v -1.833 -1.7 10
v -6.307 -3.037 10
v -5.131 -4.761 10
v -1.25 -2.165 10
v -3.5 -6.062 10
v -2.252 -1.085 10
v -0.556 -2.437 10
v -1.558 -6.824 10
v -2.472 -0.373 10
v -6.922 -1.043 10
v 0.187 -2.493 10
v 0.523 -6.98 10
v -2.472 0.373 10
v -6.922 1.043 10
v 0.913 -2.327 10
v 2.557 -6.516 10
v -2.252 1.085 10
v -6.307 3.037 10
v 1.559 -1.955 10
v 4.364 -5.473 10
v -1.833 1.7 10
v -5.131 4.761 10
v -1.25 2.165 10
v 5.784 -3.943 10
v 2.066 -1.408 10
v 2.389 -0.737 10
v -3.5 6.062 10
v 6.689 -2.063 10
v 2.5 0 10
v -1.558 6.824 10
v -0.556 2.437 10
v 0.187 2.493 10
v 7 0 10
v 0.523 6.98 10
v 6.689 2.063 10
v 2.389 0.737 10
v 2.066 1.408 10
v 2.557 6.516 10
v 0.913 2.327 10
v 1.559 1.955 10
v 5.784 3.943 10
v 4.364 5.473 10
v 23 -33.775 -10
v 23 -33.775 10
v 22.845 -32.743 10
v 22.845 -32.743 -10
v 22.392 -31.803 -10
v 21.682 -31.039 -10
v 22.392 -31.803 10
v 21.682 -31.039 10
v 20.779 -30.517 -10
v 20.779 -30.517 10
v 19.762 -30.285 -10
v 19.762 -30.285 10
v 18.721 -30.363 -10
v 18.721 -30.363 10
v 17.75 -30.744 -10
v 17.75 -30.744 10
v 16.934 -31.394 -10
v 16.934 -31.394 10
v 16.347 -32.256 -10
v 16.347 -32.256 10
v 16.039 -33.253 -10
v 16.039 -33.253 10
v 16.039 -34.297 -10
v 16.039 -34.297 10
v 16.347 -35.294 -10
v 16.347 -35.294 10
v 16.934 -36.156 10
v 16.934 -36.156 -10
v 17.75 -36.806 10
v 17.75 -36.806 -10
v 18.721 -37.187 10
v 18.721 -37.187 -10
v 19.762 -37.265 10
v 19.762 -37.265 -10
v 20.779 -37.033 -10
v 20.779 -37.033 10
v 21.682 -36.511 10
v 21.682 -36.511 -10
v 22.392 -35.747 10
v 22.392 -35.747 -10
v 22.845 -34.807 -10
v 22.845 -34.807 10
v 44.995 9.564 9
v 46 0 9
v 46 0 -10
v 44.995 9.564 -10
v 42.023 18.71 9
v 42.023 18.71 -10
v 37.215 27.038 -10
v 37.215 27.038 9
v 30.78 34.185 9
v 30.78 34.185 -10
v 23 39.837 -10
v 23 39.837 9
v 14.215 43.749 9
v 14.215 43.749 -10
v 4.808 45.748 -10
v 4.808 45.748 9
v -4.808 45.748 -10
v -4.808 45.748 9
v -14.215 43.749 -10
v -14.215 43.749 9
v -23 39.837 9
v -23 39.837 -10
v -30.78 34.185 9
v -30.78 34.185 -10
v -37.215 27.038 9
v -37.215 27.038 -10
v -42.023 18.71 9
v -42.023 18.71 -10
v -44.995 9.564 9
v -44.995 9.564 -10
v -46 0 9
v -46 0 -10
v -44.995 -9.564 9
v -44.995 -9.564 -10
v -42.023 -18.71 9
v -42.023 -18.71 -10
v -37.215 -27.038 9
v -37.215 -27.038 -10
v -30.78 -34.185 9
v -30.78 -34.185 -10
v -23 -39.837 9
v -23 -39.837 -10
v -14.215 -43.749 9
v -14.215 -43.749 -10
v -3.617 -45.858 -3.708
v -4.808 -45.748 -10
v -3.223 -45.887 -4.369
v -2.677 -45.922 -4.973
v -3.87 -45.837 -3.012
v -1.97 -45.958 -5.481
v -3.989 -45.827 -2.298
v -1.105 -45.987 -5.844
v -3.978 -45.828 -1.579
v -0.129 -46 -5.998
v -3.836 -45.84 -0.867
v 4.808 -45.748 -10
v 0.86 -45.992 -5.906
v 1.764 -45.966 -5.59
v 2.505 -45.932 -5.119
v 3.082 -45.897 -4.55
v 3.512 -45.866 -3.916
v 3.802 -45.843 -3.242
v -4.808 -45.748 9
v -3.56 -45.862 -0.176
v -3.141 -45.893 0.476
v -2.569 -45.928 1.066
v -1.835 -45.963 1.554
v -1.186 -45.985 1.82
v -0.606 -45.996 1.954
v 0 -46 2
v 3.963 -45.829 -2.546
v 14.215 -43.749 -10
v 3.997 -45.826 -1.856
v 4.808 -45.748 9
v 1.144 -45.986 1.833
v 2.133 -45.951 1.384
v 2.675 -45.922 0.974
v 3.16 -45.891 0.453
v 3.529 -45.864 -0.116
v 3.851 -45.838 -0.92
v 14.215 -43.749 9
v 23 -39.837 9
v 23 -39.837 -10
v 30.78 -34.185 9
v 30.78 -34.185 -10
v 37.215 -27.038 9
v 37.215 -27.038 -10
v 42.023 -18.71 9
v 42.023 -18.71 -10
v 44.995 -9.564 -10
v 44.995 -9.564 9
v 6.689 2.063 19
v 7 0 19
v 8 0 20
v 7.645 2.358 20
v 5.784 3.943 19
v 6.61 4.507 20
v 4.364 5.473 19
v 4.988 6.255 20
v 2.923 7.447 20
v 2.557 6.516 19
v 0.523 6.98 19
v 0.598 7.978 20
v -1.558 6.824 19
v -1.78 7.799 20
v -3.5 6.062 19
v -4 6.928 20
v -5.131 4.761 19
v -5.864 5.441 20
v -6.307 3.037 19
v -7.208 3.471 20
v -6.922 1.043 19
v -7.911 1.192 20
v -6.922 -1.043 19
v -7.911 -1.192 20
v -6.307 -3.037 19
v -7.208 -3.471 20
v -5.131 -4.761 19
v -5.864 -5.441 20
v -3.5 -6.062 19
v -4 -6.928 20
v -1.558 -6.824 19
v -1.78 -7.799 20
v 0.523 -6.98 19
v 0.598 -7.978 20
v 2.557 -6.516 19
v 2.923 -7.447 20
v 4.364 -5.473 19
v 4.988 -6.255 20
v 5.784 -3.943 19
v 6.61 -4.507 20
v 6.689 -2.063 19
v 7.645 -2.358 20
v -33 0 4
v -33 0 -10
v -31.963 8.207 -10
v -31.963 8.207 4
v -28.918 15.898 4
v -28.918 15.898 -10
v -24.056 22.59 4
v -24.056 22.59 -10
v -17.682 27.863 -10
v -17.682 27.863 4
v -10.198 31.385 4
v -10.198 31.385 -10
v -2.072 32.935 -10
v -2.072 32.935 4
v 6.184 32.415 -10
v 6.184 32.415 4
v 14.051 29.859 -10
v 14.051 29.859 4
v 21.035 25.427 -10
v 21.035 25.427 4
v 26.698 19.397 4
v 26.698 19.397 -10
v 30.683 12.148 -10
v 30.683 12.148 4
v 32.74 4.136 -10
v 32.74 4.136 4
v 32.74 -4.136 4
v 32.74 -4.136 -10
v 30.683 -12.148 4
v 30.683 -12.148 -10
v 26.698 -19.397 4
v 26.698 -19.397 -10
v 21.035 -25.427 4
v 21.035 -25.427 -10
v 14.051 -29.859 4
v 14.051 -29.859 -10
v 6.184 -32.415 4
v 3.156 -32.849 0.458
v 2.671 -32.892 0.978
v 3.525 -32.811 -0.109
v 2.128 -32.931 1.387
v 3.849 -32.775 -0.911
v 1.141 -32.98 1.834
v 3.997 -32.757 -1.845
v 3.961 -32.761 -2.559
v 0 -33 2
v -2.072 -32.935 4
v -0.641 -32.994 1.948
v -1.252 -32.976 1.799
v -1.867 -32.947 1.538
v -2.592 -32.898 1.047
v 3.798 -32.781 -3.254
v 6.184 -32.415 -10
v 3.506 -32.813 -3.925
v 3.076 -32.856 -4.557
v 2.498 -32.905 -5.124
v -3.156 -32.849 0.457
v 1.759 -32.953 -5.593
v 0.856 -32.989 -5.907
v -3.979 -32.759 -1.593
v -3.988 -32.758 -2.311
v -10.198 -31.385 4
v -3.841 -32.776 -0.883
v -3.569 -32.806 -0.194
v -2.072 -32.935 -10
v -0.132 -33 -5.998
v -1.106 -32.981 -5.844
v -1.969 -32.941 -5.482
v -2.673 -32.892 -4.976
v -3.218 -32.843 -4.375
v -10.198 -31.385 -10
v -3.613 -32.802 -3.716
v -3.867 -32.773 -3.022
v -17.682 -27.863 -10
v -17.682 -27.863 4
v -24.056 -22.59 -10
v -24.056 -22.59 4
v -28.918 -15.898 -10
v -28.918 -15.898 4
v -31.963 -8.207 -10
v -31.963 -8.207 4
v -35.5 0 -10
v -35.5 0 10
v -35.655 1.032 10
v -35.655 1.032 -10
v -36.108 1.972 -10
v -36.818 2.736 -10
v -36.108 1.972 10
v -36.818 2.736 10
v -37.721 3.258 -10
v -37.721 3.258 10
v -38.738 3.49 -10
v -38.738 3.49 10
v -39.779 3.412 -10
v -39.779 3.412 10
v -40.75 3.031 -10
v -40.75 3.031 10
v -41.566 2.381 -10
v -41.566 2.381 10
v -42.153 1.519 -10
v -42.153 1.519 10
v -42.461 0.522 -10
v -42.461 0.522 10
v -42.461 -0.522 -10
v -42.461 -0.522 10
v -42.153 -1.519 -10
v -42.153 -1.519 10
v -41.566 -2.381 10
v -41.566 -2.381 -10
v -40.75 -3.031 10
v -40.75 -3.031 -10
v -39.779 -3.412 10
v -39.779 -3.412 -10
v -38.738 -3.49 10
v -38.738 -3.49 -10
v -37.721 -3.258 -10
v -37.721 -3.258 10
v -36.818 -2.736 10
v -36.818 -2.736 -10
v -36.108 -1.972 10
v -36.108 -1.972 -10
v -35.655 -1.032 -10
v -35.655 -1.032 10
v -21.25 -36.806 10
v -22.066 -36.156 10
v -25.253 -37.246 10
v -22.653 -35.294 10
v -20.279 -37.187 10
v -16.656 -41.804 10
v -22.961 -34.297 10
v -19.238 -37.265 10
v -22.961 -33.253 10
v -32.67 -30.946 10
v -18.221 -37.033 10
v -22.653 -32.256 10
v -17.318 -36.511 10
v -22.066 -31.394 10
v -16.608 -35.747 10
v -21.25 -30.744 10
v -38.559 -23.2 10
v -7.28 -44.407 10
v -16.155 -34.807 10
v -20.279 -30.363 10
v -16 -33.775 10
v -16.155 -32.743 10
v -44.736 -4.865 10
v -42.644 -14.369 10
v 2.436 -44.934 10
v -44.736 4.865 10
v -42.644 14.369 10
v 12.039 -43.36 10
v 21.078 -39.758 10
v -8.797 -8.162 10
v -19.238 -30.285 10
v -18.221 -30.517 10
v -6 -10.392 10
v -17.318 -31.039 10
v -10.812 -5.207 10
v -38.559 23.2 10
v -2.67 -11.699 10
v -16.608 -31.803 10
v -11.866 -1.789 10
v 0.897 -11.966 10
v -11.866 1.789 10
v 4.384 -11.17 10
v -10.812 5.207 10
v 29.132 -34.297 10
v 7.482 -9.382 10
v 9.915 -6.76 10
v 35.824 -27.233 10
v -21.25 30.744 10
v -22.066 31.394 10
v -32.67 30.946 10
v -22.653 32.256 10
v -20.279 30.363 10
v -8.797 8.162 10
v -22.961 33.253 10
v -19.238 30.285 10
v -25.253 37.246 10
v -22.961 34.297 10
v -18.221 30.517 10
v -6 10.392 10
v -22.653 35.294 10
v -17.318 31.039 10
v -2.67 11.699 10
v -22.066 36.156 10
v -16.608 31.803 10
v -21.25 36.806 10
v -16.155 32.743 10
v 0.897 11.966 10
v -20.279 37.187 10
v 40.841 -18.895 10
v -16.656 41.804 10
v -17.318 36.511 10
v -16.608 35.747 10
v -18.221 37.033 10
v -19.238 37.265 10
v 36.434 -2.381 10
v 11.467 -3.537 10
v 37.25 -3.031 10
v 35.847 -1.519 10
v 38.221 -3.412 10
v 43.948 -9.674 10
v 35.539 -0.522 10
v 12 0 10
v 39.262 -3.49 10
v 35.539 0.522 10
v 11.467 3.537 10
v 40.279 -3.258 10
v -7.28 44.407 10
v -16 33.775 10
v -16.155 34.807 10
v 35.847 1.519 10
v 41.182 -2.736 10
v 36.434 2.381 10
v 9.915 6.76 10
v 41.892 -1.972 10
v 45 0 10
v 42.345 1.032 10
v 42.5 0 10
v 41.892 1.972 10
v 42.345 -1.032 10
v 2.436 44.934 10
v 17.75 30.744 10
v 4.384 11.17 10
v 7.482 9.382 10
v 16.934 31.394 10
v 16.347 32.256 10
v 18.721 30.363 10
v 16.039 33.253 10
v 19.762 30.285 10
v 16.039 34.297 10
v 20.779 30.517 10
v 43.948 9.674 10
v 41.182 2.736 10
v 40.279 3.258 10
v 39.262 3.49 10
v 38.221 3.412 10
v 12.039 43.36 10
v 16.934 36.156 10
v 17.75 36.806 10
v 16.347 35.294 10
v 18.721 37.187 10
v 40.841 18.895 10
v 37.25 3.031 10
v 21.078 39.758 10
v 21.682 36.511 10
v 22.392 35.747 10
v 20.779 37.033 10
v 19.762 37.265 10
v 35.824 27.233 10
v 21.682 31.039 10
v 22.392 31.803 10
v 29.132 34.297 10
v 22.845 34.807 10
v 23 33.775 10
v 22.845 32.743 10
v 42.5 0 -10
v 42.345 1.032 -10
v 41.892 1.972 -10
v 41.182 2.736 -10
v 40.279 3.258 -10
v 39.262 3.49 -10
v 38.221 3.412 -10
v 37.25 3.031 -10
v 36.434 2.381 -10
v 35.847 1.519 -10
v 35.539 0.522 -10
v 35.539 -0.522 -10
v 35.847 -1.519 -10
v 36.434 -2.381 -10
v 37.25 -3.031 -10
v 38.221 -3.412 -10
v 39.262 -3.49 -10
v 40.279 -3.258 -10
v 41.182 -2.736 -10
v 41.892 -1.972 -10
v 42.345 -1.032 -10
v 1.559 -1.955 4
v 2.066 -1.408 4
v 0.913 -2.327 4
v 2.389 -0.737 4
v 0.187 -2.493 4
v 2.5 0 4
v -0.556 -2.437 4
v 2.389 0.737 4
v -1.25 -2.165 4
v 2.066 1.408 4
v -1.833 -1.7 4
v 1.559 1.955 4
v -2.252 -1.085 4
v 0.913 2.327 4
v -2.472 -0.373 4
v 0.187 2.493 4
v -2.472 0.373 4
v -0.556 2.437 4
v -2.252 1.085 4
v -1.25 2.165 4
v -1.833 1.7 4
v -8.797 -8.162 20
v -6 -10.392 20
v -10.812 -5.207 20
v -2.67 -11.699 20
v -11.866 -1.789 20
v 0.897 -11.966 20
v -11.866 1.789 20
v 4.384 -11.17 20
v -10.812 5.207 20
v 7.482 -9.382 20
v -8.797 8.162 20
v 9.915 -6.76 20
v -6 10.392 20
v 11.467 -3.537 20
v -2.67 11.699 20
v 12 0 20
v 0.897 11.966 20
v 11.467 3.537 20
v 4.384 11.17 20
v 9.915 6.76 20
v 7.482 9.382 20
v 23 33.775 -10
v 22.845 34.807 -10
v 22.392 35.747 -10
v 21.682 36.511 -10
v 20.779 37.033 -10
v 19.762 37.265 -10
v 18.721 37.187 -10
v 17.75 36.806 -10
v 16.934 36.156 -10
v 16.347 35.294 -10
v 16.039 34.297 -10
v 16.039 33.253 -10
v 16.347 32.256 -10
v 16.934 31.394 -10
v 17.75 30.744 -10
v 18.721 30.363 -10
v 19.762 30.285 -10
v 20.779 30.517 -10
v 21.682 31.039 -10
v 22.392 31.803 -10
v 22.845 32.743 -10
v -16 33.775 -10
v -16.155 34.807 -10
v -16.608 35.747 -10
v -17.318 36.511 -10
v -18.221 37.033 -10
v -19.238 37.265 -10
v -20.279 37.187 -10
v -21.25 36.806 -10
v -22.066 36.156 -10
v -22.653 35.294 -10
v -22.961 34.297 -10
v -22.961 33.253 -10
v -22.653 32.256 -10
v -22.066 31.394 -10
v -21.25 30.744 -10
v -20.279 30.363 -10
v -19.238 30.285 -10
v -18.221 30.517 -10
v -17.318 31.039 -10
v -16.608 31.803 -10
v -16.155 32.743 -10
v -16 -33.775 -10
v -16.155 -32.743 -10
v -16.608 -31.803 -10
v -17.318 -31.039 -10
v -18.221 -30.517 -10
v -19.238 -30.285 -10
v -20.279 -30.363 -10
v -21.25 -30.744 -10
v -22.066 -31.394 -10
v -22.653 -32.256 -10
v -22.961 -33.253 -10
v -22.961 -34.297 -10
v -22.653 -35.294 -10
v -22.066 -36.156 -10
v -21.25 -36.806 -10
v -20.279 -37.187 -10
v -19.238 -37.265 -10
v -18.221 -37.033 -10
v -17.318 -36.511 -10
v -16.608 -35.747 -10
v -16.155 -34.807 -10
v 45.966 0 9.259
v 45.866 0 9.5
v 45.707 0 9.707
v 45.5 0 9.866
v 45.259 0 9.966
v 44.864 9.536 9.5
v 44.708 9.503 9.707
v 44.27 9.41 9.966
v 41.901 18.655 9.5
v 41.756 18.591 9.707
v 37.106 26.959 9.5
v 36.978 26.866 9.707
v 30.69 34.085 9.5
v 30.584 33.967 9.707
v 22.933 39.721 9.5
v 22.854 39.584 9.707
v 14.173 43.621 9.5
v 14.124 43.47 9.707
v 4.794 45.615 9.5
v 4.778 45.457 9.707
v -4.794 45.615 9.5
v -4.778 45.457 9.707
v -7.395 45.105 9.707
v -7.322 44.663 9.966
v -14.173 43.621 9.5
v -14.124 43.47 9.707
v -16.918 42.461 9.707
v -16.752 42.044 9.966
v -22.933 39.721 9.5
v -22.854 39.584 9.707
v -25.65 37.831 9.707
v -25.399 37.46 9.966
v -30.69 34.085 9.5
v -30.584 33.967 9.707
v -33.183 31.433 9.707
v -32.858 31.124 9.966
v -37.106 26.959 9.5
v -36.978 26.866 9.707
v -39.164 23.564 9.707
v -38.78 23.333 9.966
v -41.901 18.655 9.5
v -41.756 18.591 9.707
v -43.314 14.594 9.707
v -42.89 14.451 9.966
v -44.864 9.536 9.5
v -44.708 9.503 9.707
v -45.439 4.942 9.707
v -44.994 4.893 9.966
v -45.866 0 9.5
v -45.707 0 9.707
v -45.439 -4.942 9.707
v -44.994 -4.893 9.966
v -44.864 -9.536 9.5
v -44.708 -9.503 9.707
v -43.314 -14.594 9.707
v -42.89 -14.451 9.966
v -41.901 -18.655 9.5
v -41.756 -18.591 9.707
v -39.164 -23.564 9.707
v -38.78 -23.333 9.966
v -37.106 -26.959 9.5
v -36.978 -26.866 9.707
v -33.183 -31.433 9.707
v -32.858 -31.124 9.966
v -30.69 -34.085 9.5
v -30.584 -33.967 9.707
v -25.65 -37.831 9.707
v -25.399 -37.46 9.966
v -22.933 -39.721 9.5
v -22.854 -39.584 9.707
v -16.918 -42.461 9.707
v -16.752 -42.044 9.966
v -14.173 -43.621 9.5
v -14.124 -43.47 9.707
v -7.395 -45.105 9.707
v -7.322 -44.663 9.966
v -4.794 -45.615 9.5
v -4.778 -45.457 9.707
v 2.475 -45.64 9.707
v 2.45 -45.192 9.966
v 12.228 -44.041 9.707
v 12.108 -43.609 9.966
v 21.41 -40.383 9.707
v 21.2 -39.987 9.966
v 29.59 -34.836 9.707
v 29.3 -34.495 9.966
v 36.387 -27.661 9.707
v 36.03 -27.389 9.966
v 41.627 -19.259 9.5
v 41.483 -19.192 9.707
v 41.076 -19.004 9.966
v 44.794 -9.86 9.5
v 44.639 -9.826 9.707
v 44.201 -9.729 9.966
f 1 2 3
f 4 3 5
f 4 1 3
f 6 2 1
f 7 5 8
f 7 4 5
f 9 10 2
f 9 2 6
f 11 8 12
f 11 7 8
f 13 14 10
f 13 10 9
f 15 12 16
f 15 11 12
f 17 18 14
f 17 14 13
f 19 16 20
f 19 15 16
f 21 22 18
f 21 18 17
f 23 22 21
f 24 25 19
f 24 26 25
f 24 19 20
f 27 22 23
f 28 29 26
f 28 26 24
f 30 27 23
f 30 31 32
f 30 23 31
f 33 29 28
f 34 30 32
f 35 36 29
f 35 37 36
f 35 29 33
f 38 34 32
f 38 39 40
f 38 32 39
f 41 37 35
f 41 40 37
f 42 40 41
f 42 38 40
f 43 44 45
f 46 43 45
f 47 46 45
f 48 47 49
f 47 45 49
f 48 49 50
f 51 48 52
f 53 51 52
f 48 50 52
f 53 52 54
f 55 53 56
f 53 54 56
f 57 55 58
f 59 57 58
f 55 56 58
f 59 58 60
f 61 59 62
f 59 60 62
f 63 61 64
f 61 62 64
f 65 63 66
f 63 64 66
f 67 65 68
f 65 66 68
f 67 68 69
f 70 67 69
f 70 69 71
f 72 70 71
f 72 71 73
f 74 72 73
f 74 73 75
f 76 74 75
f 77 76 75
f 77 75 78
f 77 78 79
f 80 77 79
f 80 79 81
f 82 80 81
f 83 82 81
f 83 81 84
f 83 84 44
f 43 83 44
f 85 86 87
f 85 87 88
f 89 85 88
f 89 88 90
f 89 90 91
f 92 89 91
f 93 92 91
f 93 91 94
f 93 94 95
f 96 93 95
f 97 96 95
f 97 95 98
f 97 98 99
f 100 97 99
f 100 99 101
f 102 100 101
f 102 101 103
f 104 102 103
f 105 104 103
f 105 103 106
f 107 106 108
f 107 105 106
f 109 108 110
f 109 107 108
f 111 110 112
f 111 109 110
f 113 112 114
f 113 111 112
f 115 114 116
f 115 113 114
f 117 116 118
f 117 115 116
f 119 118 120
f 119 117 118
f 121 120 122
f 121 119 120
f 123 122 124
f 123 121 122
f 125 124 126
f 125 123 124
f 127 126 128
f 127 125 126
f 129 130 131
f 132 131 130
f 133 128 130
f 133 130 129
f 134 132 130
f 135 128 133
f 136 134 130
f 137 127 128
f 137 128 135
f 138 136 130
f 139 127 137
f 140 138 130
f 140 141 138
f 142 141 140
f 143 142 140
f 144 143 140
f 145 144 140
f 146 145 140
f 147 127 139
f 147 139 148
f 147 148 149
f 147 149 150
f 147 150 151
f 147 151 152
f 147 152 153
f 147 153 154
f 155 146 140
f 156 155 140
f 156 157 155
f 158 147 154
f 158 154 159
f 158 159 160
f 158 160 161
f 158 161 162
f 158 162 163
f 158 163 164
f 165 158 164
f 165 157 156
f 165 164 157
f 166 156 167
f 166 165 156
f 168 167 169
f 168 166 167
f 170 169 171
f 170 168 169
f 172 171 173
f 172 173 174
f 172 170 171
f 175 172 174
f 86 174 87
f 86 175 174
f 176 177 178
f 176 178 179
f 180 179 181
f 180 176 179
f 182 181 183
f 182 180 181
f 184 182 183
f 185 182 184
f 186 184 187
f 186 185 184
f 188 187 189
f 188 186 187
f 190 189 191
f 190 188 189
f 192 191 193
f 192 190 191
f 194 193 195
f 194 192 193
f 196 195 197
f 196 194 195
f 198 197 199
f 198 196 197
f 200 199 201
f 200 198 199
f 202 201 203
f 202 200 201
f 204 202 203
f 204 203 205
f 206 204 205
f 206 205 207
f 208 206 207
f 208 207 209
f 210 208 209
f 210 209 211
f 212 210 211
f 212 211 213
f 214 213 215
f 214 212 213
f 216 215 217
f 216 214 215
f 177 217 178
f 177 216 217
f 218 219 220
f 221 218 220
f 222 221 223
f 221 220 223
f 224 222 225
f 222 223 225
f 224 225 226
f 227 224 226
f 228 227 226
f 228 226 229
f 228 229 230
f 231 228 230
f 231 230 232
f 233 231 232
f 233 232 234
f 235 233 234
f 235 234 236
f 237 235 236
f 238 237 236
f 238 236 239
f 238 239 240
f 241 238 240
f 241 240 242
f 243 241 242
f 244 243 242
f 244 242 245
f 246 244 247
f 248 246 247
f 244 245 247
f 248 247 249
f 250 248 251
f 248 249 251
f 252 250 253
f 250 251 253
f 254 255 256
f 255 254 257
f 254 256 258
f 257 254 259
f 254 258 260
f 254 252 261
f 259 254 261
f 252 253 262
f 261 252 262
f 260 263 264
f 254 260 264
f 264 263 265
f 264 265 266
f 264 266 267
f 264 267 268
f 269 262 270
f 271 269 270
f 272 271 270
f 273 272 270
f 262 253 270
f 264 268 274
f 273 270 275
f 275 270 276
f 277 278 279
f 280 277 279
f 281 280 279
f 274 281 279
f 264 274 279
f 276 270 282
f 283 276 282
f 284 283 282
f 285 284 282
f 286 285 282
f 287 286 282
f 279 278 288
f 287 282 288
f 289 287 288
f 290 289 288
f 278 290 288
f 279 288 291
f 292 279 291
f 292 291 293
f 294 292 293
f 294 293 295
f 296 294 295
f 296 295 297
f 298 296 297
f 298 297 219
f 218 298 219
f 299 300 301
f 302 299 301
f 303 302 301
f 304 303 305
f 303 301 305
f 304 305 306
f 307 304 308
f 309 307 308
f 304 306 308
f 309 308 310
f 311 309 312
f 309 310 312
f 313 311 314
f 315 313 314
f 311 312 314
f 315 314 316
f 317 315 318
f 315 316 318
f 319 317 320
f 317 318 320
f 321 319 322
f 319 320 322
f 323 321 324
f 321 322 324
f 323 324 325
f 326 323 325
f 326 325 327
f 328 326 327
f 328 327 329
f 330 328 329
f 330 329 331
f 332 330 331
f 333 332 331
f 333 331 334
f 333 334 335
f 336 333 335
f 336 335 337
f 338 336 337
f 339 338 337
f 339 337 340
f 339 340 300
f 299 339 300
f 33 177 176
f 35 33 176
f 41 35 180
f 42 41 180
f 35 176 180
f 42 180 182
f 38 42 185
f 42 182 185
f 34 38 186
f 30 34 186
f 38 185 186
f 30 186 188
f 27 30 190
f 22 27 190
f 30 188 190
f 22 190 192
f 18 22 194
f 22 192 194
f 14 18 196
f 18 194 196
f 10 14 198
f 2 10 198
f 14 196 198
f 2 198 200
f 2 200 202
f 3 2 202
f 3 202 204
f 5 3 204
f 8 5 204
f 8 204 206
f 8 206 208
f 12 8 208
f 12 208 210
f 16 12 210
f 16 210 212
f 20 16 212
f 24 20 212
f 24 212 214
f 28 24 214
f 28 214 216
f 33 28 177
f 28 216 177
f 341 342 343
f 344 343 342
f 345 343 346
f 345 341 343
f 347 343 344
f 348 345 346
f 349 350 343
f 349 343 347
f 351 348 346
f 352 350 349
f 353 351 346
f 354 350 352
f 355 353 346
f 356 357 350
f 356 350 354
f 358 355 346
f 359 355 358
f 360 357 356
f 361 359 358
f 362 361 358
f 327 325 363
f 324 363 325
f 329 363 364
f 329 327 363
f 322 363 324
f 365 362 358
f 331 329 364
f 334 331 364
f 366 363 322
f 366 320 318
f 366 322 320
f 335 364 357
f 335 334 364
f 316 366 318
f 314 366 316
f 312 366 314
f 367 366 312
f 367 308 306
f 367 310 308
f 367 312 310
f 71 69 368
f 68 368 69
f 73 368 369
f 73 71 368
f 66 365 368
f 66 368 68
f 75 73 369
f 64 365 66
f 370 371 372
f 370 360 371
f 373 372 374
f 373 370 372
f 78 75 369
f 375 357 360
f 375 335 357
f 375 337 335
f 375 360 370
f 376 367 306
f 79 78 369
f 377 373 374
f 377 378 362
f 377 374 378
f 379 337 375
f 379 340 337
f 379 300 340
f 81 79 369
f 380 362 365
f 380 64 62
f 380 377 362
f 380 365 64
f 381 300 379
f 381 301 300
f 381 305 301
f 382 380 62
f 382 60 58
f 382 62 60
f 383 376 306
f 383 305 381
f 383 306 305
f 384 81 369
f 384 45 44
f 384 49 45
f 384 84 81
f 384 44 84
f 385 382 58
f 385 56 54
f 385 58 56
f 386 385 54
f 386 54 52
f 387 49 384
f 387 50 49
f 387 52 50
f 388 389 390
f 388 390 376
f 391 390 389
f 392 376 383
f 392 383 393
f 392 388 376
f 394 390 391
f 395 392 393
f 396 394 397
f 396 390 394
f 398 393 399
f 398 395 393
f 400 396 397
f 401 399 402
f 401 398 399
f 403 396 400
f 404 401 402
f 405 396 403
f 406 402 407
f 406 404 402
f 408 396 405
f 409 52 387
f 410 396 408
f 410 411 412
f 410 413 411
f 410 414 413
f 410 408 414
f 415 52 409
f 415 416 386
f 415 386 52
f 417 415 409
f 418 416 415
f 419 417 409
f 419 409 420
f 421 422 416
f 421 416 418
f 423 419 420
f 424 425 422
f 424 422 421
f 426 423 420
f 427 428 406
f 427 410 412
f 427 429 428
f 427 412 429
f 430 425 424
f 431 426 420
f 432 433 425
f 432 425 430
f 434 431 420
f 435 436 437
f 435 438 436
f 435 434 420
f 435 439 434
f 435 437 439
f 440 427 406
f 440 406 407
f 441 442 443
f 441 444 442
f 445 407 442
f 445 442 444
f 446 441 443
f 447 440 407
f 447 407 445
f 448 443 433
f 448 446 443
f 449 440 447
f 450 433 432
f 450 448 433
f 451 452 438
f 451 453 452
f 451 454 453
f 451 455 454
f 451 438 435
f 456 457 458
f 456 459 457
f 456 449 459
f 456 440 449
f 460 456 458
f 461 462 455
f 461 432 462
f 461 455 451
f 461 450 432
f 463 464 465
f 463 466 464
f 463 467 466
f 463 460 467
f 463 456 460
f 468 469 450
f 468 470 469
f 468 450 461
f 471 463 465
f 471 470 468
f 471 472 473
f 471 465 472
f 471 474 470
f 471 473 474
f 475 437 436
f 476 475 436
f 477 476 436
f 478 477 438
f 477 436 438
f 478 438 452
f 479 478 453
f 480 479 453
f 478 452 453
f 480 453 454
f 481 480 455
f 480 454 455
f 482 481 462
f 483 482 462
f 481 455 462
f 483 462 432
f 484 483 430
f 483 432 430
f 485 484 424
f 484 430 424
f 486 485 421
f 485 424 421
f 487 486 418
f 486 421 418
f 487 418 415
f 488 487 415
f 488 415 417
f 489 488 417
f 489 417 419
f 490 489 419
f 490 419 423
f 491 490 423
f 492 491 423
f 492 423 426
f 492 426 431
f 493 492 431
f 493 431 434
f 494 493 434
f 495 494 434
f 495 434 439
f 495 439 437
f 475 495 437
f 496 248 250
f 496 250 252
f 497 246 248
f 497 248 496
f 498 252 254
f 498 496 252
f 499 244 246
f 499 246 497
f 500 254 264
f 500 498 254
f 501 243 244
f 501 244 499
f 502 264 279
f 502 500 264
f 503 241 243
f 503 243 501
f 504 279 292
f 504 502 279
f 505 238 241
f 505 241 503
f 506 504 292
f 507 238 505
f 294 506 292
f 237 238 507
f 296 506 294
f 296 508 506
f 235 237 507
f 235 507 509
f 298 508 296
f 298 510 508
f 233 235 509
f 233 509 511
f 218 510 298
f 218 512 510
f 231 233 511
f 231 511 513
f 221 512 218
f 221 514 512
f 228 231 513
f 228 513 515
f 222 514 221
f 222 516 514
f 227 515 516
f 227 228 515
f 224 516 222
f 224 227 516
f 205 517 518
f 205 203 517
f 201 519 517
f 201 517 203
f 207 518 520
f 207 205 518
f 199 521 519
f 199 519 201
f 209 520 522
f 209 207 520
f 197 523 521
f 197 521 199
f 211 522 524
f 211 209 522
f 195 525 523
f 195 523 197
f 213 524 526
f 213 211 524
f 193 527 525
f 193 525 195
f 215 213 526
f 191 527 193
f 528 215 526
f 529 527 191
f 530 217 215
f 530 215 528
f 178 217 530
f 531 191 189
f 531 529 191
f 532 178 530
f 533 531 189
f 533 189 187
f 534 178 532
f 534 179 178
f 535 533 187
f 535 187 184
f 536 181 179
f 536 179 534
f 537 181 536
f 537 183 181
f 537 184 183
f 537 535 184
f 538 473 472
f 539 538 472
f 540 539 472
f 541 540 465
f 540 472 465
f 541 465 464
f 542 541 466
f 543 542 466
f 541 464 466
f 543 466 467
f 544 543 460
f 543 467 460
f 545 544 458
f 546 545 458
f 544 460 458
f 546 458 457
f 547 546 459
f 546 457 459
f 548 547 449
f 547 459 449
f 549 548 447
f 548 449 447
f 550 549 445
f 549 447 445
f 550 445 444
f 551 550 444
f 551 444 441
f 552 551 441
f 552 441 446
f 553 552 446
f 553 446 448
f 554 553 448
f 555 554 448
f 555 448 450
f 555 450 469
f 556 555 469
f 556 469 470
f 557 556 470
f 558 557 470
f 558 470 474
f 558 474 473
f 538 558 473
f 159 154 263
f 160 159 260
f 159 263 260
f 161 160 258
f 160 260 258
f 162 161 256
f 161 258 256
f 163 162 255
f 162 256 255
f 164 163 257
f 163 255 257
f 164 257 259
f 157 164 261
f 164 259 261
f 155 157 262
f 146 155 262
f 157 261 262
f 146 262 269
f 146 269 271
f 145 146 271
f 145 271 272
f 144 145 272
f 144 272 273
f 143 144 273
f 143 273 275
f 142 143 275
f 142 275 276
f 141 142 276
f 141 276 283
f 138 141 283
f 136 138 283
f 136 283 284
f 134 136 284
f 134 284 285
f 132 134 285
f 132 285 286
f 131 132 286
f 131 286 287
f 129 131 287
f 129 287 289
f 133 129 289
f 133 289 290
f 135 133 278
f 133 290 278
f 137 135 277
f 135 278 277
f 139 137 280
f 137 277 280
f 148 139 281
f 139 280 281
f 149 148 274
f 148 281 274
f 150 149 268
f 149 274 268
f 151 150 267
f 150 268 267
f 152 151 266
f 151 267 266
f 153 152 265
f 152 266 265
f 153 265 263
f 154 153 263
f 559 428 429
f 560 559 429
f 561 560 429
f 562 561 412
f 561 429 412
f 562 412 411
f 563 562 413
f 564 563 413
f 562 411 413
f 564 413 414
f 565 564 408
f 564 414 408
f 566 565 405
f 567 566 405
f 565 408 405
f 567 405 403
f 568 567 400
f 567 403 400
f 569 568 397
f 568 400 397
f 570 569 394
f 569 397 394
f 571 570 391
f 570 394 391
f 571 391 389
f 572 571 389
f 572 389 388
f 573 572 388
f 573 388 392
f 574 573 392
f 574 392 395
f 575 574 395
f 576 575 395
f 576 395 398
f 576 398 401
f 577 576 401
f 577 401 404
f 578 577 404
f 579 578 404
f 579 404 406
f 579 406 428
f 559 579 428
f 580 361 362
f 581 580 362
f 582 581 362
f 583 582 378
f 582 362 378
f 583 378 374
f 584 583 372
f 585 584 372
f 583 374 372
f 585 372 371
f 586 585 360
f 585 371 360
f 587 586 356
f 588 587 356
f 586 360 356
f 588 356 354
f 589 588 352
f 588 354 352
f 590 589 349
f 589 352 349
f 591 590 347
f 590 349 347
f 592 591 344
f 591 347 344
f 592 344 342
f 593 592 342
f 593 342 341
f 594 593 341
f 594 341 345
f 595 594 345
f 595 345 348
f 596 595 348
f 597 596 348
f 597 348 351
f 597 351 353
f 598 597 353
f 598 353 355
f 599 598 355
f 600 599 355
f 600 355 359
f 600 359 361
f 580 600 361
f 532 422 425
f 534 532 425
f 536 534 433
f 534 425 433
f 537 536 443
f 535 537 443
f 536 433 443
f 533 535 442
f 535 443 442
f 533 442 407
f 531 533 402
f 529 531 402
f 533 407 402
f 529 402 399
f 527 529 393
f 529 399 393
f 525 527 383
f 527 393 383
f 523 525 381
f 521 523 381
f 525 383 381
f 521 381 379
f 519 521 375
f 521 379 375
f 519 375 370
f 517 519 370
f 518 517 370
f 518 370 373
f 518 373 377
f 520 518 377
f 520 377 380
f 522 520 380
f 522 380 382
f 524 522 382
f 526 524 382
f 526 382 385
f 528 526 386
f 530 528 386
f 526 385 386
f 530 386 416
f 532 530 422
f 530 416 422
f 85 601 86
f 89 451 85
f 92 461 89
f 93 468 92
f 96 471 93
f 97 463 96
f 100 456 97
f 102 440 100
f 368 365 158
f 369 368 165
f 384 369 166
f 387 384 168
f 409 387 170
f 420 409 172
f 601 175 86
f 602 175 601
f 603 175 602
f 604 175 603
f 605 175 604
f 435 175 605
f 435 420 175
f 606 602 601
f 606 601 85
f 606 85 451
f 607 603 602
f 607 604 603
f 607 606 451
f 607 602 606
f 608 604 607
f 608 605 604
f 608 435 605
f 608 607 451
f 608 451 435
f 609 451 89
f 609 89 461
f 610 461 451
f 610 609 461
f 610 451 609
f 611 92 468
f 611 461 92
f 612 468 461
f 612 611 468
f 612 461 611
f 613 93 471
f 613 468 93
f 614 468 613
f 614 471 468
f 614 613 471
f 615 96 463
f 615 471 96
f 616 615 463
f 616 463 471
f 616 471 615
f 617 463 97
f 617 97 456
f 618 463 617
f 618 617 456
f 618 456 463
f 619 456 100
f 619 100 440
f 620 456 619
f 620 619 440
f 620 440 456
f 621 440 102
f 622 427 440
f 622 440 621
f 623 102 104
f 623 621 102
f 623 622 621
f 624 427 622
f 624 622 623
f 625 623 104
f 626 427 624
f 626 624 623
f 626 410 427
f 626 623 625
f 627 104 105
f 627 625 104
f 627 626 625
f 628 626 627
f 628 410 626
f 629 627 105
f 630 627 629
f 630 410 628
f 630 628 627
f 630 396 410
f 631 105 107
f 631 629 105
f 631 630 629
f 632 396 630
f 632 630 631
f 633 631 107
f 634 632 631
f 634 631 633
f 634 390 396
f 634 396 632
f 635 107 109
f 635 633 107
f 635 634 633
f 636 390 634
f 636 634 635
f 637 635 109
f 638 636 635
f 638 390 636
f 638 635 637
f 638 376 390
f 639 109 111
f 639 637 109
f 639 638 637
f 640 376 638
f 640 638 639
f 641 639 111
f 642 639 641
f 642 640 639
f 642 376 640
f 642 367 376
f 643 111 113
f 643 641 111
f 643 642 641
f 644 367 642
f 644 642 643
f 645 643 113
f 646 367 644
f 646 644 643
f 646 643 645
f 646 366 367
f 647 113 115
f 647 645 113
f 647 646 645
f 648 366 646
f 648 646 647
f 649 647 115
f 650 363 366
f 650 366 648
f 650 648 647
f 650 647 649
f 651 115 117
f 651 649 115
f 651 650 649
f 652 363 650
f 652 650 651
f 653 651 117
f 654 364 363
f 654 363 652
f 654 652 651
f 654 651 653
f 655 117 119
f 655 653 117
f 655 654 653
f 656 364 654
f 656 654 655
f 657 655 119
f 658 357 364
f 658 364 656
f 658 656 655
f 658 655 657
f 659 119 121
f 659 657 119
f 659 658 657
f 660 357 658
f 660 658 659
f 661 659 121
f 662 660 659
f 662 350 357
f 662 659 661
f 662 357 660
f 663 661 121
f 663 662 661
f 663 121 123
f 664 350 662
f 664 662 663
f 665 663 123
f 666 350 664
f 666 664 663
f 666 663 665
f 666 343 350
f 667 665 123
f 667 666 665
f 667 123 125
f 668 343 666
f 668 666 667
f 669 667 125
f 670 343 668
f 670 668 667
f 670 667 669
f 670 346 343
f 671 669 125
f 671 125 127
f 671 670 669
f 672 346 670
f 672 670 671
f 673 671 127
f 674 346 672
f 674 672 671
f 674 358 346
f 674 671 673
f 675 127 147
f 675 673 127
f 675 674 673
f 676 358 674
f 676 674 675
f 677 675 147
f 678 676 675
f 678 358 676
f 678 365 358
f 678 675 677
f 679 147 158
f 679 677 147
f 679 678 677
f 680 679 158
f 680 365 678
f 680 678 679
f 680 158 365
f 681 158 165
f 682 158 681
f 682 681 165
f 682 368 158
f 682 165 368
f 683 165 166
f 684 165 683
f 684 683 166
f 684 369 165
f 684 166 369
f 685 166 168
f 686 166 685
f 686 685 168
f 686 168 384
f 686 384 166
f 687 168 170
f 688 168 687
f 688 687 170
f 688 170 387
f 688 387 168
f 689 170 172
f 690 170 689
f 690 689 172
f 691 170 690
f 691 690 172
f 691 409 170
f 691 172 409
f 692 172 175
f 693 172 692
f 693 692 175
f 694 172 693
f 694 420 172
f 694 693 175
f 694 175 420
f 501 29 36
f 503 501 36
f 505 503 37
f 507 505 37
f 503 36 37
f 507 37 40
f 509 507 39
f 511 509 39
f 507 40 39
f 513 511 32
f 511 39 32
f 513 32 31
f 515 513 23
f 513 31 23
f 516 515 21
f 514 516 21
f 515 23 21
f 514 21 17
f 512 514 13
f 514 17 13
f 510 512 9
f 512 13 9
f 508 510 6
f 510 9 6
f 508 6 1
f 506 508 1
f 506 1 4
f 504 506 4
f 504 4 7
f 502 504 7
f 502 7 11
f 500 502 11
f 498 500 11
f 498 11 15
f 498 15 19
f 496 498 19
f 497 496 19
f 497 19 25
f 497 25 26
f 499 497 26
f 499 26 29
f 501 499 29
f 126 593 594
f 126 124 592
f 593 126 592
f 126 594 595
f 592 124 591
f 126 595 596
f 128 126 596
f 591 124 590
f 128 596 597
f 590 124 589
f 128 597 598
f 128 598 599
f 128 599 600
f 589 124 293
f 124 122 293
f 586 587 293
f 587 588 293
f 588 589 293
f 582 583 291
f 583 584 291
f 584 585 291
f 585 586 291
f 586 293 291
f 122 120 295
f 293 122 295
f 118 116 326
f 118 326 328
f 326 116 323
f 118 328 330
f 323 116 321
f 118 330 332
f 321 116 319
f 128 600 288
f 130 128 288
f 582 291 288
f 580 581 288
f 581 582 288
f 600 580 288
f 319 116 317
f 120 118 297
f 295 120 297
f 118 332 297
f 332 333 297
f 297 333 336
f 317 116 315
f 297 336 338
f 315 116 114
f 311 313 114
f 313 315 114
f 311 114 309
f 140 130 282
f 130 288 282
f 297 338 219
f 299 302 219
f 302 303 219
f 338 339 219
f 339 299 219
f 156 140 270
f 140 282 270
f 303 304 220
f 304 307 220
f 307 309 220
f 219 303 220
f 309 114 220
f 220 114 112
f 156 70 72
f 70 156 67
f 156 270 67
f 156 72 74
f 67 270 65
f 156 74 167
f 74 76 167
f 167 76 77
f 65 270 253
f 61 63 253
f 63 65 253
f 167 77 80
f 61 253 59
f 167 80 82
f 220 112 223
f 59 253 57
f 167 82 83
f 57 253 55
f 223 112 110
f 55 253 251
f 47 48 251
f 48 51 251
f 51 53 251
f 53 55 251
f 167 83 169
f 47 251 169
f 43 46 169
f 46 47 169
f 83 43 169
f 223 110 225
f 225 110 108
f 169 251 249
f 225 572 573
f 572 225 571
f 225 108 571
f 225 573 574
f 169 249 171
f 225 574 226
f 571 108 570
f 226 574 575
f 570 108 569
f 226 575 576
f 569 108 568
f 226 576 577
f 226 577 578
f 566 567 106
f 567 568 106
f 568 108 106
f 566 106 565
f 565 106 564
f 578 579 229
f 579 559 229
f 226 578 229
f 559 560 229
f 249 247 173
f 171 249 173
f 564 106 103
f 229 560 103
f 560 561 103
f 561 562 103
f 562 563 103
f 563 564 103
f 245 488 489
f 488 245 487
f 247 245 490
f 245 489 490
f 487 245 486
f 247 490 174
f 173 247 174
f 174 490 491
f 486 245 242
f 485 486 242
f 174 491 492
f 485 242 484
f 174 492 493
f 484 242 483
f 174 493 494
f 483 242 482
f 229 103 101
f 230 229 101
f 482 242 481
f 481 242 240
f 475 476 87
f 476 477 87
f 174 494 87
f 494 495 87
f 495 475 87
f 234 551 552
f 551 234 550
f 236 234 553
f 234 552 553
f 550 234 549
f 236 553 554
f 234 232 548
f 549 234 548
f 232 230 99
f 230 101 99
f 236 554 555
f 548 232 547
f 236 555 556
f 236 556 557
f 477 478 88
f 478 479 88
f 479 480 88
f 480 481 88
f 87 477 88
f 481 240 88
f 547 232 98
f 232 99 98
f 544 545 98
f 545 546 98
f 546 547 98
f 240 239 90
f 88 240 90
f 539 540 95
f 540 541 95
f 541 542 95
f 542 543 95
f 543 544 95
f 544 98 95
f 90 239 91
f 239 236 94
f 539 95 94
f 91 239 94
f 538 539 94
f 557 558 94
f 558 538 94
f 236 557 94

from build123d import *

# Parameters (mm, degrees)
SKETCH1_R           = 46
BOSS_EXTRUDE1_DEPTH = 10
SKETCH2_R           = 12
BOSS_EXTRUDE2_DEPTH = 10
SKETCH3_R           = 3.5
CUT_EXTRUDE1_DEPTH  = 69.058798109
FILLET2_R           = 1
SKETCH4_R           = 33
CUT_EXTRUDE2_DEPTH  = 14
SKETCH9_R           = 7
CUT_EXTRUDE3_DEPTH  = 10
SKETCH10_R          = 2.5
CUT_EXTRUDE4_DEPTH  = 69.058798109
CHAMFER1_SIZE       = 1
SKETCH12_R          = 4
CUT_EXTRUDE7_DEPTH  = 100


with BuildPart() as part:
    # Sketch1 → Boss-Extrude1 (new, symmetric)
    with BuildSketch(Plane.XY):
        Circle(SKETCH1_R)
    extrude(amount=BOSS_EXTRUDE1_DEPTH, both=True)

    # Sketch2 → Boss-Extrude2 (add)
    with BuildSketch(Plane.XY.offset(10)):
        Circle(SKETCH2_R)
    extrude(amount=BOSS_EXTRUDE2_DEPTH)

    # Sketch3 → Cut-Extrude1 (cut, through all)
    with BuildSketch(Plane.XY.offset(10)):
        with Locations((39, 0)):
            Circle(SKETCH3_R)
        with Locations((19.5, -33.774990748)):
            Circle(SKETCH3_R)
        with Locations((-19.5, -33.774990748)):
            Circle(SKETCH3_R)
        with Locations((-39, 0)):
            Circle(SKETCH3_R)
        with Locations((-19.5, 33.774990748)):
            Circle(SKETCH3_R)
        with Locations((19.5, 33.774990748)):
            Circle(SKETCH3_R)
    extrude(amount=-CUT_EXTRUDE1_DEPTH, mode=Mode.SUBTRACT)

    # Fillet2
    fillet2_edges = [part.edges().sort_by_distance(p)[0] for p in [
        (-46, 0, 10),
    ]]
    fillet(fillet2_edges, radius=FILLET2_R)

    # Sketch4 → Cut-Extrude2 (cut)
    with BuildSketch(Plane(origin=(0, 0, -10), x_dir=(-1, 0, 0), z_dir=(0, 0, -1))):
        Circle(SKETCH4_R)
    extrude(amount=-CUT_EXTRUDE2_DEPTH, mode=Mode.SUBTRACT)

    # Sketch9 → Cut-Extrude3 (cut)
    with BuildSketch(Plane.XY.offset(20)):
        Circle(SKETCH9_R)
    extrude(amount=-CUT_EXTRUDE3_DEPTH, mode=Mode.SUBTRACT)

    # Sketch10 → Cut-Extrude4 (cut, through all)
    with BuildSketch(Plane.XY.offset(10)):
        Circle(SKETCH10_R)
    extrude(amount=-CUT_EXTRUDE4_DEPTH, mode=Mode.SUBTRACT)

    # Chamfer1
    chamfer1_edges = [part.edges().sort_by_distance(p)[0] for p in [
        (-7, 0, 20),
    ]]
    chamfer(chamfer1_edges, length=CHAMFER1_SIZE)

    # Sketch12 → Cut-Extrude7 (cut)
    with BuildSketch(Plane(origin=(0, 0, 0), x_dir=(1, 0, 0), z_dir=(0, 1, 0))):
        with Locations(Location((0, 2, 0), (0, 0, 270))):
            Circle(SKETCH12_R)
    extrude(amount=-CUT_EXTRUDE7_DEPTH, mode=Mode.SUBTRACT)


solid = part.part
